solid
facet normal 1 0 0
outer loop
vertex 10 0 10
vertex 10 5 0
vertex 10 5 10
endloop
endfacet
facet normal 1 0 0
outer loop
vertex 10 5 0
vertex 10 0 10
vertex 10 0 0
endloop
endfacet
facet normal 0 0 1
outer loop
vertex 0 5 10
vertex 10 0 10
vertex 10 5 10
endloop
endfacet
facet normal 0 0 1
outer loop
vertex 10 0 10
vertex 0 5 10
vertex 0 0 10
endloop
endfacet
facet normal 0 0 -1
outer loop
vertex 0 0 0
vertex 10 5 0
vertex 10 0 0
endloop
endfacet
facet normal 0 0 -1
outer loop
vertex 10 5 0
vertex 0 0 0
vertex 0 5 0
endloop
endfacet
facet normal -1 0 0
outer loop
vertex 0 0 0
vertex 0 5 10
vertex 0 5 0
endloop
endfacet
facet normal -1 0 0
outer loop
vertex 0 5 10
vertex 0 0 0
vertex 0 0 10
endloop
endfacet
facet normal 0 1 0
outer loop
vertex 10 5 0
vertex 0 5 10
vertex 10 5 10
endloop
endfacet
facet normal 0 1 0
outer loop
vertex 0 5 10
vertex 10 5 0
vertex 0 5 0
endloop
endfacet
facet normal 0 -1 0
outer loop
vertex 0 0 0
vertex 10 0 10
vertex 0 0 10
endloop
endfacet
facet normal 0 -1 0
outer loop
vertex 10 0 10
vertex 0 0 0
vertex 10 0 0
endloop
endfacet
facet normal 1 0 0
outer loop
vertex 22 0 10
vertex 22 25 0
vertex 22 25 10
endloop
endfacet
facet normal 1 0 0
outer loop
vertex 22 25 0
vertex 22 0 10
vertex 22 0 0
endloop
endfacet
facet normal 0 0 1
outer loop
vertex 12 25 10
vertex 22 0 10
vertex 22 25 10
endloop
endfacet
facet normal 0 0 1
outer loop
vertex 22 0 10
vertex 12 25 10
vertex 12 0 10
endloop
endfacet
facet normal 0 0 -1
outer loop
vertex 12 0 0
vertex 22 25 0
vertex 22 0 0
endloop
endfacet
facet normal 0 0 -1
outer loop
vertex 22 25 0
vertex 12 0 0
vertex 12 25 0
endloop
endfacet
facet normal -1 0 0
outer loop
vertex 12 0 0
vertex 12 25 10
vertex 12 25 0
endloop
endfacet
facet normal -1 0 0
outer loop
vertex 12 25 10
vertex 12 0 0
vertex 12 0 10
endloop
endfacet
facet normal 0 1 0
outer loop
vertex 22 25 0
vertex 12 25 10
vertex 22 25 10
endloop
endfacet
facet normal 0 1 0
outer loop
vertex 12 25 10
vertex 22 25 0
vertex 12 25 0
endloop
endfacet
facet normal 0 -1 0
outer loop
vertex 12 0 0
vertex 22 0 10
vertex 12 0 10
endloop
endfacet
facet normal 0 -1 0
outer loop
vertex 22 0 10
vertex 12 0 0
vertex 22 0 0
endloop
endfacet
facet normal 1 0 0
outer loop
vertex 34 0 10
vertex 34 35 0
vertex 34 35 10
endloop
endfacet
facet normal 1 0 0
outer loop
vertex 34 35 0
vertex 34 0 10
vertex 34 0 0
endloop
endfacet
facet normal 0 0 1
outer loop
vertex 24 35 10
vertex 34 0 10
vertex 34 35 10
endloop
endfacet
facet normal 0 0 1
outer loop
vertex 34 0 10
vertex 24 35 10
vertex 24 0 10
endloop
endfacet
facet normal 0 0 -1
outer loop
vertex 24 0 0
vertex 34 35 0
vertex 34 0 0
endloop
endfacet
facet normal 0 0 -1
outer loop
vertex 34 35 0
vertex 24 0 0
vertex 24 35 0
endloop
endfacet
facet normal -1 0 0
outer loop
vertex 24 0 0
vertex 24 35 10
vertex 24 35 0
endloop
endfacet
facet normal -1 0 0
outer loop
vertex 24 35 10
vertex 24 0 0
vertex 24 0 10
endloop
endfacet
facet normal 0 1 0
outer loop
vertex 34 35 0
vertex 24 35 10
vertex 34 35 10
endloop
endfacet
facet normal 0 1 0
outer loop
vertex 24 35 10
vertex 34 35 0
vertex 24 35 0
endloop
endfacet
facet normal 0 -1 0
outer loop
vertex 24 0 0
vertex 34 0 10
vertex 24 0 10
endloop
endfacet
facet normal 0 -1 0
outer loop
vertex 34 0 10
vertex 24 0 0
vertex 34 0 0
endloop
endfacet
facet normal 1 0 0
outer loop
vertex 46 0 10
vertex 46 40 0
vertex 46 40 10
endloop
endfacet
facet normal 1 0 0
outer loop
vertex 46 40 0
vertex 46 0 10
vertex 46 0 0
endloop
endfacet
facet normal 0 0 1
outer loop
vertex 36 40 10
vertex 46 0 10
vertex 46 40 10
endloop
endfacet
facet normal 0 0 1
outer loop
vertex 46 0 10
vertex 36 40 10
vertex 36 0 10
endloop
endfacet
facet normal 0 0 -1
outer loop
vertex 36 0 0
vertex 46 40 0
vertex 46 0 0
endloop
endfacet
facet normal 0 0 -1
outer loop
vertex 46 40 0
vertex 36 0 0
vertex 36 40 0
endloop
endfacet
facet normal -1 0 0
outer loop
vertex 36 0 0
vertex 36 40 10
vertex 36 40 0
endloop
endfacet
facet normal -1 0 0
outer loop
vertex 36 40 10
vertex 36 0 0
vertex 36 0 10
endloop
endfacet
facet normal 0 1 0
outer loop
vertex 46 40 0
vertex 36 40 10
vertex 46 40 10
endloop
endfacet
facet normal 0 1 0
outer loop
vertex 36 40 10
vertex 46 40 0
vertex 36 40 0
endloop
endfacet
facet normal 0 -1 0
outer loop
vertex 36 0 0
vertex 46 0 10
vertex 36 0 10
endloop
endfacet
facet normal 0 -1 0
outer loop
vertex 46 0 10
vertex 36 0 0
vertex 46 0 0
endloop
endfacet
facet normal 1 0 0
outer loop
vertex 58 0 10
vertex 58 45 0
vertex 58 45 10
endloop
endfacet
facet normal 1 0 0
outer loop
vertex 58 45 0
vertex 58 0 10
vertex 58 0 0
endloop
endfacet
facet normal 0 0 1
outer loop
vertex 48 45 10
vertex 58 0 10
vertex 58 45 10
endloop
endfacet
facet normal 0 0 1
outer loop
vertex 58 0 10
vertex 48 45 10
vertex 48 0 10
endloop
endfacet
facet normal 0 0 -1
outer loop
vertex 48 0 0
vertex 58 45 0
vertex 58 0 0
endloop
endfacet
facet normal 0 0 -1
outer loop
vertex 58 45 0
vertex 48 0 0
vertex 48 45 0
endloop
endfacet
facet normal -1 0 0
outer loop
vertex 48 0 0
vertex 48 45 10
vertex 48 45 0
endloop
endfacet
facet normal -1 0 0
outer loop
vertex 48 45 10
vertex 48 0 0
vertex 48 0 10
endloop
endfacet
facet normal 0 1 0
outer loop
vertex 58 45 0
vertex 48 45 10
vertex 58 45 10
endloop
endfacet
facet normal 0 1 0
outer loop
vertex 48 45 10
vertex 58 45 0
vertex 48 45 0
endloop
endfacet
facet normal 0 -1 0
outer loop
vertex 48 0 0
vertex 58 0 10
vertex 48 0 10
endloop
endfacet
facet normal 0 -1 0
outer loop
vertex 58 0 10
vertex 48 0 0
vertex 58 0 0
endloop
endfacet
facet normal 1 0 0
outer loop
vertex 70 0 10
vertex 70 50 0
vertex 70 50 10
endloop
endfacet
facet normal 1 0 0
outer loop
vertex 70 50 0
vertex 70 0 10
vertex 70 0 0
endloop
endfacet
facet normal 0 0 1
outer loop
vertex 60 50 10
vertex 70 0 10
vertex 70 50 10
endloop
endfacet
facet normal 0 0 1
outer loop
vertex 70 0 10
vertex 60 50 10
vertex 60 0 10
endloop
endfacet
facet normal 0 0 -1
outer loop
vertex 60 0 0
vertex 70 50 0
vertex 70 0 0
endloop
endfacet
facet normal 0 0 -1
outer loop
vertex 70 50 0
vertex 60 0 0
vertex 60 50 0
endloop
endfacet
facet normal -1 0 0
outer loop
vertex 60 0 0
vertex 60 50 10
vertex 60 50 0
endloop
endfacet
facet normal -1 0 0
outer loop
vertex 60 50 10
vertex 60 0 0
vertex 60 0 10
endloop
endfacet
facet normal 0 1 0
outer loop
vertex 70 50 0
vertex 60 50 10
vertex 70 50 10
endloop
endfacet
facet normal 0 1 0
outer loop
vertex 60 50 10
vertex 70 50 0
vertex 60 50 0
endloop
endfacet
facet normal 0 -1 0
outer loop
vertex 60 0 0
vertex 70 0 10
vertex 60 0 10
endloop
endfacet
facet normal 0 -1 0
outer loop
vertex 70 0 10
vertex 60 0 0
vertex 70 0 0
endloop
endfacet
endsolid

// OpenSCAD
// OpenSCAD Quick Sort
// Sorting a list of numbers visually (rendering bars)
// OpenSCAD is functional, lists are immutable.

function quicksort(list) = 
    len(list) <= 1 ? list :
    let (
        pivot = list[0],
        rest = [for (i = [1 : len(list)-1]) list[i]],
        less = [for (x = rest) if (x < pivot) x],
        greater = [for (x = rest) if (x >= pivot) x]
    )
    concat(quicksort(less), [pivot], quicksort(greater));

data = [10, 7, 8, 9, 1, 5];
sorted = quicksort(data);

echo("Original:", data);
echo("Sorted:", sorted);

// Visualize
for (i = [0 : len(sorted)-1]) {
    translate([i * 12, 0, 0])
    cube([10, sorted[i] * 5, 10]);
}
